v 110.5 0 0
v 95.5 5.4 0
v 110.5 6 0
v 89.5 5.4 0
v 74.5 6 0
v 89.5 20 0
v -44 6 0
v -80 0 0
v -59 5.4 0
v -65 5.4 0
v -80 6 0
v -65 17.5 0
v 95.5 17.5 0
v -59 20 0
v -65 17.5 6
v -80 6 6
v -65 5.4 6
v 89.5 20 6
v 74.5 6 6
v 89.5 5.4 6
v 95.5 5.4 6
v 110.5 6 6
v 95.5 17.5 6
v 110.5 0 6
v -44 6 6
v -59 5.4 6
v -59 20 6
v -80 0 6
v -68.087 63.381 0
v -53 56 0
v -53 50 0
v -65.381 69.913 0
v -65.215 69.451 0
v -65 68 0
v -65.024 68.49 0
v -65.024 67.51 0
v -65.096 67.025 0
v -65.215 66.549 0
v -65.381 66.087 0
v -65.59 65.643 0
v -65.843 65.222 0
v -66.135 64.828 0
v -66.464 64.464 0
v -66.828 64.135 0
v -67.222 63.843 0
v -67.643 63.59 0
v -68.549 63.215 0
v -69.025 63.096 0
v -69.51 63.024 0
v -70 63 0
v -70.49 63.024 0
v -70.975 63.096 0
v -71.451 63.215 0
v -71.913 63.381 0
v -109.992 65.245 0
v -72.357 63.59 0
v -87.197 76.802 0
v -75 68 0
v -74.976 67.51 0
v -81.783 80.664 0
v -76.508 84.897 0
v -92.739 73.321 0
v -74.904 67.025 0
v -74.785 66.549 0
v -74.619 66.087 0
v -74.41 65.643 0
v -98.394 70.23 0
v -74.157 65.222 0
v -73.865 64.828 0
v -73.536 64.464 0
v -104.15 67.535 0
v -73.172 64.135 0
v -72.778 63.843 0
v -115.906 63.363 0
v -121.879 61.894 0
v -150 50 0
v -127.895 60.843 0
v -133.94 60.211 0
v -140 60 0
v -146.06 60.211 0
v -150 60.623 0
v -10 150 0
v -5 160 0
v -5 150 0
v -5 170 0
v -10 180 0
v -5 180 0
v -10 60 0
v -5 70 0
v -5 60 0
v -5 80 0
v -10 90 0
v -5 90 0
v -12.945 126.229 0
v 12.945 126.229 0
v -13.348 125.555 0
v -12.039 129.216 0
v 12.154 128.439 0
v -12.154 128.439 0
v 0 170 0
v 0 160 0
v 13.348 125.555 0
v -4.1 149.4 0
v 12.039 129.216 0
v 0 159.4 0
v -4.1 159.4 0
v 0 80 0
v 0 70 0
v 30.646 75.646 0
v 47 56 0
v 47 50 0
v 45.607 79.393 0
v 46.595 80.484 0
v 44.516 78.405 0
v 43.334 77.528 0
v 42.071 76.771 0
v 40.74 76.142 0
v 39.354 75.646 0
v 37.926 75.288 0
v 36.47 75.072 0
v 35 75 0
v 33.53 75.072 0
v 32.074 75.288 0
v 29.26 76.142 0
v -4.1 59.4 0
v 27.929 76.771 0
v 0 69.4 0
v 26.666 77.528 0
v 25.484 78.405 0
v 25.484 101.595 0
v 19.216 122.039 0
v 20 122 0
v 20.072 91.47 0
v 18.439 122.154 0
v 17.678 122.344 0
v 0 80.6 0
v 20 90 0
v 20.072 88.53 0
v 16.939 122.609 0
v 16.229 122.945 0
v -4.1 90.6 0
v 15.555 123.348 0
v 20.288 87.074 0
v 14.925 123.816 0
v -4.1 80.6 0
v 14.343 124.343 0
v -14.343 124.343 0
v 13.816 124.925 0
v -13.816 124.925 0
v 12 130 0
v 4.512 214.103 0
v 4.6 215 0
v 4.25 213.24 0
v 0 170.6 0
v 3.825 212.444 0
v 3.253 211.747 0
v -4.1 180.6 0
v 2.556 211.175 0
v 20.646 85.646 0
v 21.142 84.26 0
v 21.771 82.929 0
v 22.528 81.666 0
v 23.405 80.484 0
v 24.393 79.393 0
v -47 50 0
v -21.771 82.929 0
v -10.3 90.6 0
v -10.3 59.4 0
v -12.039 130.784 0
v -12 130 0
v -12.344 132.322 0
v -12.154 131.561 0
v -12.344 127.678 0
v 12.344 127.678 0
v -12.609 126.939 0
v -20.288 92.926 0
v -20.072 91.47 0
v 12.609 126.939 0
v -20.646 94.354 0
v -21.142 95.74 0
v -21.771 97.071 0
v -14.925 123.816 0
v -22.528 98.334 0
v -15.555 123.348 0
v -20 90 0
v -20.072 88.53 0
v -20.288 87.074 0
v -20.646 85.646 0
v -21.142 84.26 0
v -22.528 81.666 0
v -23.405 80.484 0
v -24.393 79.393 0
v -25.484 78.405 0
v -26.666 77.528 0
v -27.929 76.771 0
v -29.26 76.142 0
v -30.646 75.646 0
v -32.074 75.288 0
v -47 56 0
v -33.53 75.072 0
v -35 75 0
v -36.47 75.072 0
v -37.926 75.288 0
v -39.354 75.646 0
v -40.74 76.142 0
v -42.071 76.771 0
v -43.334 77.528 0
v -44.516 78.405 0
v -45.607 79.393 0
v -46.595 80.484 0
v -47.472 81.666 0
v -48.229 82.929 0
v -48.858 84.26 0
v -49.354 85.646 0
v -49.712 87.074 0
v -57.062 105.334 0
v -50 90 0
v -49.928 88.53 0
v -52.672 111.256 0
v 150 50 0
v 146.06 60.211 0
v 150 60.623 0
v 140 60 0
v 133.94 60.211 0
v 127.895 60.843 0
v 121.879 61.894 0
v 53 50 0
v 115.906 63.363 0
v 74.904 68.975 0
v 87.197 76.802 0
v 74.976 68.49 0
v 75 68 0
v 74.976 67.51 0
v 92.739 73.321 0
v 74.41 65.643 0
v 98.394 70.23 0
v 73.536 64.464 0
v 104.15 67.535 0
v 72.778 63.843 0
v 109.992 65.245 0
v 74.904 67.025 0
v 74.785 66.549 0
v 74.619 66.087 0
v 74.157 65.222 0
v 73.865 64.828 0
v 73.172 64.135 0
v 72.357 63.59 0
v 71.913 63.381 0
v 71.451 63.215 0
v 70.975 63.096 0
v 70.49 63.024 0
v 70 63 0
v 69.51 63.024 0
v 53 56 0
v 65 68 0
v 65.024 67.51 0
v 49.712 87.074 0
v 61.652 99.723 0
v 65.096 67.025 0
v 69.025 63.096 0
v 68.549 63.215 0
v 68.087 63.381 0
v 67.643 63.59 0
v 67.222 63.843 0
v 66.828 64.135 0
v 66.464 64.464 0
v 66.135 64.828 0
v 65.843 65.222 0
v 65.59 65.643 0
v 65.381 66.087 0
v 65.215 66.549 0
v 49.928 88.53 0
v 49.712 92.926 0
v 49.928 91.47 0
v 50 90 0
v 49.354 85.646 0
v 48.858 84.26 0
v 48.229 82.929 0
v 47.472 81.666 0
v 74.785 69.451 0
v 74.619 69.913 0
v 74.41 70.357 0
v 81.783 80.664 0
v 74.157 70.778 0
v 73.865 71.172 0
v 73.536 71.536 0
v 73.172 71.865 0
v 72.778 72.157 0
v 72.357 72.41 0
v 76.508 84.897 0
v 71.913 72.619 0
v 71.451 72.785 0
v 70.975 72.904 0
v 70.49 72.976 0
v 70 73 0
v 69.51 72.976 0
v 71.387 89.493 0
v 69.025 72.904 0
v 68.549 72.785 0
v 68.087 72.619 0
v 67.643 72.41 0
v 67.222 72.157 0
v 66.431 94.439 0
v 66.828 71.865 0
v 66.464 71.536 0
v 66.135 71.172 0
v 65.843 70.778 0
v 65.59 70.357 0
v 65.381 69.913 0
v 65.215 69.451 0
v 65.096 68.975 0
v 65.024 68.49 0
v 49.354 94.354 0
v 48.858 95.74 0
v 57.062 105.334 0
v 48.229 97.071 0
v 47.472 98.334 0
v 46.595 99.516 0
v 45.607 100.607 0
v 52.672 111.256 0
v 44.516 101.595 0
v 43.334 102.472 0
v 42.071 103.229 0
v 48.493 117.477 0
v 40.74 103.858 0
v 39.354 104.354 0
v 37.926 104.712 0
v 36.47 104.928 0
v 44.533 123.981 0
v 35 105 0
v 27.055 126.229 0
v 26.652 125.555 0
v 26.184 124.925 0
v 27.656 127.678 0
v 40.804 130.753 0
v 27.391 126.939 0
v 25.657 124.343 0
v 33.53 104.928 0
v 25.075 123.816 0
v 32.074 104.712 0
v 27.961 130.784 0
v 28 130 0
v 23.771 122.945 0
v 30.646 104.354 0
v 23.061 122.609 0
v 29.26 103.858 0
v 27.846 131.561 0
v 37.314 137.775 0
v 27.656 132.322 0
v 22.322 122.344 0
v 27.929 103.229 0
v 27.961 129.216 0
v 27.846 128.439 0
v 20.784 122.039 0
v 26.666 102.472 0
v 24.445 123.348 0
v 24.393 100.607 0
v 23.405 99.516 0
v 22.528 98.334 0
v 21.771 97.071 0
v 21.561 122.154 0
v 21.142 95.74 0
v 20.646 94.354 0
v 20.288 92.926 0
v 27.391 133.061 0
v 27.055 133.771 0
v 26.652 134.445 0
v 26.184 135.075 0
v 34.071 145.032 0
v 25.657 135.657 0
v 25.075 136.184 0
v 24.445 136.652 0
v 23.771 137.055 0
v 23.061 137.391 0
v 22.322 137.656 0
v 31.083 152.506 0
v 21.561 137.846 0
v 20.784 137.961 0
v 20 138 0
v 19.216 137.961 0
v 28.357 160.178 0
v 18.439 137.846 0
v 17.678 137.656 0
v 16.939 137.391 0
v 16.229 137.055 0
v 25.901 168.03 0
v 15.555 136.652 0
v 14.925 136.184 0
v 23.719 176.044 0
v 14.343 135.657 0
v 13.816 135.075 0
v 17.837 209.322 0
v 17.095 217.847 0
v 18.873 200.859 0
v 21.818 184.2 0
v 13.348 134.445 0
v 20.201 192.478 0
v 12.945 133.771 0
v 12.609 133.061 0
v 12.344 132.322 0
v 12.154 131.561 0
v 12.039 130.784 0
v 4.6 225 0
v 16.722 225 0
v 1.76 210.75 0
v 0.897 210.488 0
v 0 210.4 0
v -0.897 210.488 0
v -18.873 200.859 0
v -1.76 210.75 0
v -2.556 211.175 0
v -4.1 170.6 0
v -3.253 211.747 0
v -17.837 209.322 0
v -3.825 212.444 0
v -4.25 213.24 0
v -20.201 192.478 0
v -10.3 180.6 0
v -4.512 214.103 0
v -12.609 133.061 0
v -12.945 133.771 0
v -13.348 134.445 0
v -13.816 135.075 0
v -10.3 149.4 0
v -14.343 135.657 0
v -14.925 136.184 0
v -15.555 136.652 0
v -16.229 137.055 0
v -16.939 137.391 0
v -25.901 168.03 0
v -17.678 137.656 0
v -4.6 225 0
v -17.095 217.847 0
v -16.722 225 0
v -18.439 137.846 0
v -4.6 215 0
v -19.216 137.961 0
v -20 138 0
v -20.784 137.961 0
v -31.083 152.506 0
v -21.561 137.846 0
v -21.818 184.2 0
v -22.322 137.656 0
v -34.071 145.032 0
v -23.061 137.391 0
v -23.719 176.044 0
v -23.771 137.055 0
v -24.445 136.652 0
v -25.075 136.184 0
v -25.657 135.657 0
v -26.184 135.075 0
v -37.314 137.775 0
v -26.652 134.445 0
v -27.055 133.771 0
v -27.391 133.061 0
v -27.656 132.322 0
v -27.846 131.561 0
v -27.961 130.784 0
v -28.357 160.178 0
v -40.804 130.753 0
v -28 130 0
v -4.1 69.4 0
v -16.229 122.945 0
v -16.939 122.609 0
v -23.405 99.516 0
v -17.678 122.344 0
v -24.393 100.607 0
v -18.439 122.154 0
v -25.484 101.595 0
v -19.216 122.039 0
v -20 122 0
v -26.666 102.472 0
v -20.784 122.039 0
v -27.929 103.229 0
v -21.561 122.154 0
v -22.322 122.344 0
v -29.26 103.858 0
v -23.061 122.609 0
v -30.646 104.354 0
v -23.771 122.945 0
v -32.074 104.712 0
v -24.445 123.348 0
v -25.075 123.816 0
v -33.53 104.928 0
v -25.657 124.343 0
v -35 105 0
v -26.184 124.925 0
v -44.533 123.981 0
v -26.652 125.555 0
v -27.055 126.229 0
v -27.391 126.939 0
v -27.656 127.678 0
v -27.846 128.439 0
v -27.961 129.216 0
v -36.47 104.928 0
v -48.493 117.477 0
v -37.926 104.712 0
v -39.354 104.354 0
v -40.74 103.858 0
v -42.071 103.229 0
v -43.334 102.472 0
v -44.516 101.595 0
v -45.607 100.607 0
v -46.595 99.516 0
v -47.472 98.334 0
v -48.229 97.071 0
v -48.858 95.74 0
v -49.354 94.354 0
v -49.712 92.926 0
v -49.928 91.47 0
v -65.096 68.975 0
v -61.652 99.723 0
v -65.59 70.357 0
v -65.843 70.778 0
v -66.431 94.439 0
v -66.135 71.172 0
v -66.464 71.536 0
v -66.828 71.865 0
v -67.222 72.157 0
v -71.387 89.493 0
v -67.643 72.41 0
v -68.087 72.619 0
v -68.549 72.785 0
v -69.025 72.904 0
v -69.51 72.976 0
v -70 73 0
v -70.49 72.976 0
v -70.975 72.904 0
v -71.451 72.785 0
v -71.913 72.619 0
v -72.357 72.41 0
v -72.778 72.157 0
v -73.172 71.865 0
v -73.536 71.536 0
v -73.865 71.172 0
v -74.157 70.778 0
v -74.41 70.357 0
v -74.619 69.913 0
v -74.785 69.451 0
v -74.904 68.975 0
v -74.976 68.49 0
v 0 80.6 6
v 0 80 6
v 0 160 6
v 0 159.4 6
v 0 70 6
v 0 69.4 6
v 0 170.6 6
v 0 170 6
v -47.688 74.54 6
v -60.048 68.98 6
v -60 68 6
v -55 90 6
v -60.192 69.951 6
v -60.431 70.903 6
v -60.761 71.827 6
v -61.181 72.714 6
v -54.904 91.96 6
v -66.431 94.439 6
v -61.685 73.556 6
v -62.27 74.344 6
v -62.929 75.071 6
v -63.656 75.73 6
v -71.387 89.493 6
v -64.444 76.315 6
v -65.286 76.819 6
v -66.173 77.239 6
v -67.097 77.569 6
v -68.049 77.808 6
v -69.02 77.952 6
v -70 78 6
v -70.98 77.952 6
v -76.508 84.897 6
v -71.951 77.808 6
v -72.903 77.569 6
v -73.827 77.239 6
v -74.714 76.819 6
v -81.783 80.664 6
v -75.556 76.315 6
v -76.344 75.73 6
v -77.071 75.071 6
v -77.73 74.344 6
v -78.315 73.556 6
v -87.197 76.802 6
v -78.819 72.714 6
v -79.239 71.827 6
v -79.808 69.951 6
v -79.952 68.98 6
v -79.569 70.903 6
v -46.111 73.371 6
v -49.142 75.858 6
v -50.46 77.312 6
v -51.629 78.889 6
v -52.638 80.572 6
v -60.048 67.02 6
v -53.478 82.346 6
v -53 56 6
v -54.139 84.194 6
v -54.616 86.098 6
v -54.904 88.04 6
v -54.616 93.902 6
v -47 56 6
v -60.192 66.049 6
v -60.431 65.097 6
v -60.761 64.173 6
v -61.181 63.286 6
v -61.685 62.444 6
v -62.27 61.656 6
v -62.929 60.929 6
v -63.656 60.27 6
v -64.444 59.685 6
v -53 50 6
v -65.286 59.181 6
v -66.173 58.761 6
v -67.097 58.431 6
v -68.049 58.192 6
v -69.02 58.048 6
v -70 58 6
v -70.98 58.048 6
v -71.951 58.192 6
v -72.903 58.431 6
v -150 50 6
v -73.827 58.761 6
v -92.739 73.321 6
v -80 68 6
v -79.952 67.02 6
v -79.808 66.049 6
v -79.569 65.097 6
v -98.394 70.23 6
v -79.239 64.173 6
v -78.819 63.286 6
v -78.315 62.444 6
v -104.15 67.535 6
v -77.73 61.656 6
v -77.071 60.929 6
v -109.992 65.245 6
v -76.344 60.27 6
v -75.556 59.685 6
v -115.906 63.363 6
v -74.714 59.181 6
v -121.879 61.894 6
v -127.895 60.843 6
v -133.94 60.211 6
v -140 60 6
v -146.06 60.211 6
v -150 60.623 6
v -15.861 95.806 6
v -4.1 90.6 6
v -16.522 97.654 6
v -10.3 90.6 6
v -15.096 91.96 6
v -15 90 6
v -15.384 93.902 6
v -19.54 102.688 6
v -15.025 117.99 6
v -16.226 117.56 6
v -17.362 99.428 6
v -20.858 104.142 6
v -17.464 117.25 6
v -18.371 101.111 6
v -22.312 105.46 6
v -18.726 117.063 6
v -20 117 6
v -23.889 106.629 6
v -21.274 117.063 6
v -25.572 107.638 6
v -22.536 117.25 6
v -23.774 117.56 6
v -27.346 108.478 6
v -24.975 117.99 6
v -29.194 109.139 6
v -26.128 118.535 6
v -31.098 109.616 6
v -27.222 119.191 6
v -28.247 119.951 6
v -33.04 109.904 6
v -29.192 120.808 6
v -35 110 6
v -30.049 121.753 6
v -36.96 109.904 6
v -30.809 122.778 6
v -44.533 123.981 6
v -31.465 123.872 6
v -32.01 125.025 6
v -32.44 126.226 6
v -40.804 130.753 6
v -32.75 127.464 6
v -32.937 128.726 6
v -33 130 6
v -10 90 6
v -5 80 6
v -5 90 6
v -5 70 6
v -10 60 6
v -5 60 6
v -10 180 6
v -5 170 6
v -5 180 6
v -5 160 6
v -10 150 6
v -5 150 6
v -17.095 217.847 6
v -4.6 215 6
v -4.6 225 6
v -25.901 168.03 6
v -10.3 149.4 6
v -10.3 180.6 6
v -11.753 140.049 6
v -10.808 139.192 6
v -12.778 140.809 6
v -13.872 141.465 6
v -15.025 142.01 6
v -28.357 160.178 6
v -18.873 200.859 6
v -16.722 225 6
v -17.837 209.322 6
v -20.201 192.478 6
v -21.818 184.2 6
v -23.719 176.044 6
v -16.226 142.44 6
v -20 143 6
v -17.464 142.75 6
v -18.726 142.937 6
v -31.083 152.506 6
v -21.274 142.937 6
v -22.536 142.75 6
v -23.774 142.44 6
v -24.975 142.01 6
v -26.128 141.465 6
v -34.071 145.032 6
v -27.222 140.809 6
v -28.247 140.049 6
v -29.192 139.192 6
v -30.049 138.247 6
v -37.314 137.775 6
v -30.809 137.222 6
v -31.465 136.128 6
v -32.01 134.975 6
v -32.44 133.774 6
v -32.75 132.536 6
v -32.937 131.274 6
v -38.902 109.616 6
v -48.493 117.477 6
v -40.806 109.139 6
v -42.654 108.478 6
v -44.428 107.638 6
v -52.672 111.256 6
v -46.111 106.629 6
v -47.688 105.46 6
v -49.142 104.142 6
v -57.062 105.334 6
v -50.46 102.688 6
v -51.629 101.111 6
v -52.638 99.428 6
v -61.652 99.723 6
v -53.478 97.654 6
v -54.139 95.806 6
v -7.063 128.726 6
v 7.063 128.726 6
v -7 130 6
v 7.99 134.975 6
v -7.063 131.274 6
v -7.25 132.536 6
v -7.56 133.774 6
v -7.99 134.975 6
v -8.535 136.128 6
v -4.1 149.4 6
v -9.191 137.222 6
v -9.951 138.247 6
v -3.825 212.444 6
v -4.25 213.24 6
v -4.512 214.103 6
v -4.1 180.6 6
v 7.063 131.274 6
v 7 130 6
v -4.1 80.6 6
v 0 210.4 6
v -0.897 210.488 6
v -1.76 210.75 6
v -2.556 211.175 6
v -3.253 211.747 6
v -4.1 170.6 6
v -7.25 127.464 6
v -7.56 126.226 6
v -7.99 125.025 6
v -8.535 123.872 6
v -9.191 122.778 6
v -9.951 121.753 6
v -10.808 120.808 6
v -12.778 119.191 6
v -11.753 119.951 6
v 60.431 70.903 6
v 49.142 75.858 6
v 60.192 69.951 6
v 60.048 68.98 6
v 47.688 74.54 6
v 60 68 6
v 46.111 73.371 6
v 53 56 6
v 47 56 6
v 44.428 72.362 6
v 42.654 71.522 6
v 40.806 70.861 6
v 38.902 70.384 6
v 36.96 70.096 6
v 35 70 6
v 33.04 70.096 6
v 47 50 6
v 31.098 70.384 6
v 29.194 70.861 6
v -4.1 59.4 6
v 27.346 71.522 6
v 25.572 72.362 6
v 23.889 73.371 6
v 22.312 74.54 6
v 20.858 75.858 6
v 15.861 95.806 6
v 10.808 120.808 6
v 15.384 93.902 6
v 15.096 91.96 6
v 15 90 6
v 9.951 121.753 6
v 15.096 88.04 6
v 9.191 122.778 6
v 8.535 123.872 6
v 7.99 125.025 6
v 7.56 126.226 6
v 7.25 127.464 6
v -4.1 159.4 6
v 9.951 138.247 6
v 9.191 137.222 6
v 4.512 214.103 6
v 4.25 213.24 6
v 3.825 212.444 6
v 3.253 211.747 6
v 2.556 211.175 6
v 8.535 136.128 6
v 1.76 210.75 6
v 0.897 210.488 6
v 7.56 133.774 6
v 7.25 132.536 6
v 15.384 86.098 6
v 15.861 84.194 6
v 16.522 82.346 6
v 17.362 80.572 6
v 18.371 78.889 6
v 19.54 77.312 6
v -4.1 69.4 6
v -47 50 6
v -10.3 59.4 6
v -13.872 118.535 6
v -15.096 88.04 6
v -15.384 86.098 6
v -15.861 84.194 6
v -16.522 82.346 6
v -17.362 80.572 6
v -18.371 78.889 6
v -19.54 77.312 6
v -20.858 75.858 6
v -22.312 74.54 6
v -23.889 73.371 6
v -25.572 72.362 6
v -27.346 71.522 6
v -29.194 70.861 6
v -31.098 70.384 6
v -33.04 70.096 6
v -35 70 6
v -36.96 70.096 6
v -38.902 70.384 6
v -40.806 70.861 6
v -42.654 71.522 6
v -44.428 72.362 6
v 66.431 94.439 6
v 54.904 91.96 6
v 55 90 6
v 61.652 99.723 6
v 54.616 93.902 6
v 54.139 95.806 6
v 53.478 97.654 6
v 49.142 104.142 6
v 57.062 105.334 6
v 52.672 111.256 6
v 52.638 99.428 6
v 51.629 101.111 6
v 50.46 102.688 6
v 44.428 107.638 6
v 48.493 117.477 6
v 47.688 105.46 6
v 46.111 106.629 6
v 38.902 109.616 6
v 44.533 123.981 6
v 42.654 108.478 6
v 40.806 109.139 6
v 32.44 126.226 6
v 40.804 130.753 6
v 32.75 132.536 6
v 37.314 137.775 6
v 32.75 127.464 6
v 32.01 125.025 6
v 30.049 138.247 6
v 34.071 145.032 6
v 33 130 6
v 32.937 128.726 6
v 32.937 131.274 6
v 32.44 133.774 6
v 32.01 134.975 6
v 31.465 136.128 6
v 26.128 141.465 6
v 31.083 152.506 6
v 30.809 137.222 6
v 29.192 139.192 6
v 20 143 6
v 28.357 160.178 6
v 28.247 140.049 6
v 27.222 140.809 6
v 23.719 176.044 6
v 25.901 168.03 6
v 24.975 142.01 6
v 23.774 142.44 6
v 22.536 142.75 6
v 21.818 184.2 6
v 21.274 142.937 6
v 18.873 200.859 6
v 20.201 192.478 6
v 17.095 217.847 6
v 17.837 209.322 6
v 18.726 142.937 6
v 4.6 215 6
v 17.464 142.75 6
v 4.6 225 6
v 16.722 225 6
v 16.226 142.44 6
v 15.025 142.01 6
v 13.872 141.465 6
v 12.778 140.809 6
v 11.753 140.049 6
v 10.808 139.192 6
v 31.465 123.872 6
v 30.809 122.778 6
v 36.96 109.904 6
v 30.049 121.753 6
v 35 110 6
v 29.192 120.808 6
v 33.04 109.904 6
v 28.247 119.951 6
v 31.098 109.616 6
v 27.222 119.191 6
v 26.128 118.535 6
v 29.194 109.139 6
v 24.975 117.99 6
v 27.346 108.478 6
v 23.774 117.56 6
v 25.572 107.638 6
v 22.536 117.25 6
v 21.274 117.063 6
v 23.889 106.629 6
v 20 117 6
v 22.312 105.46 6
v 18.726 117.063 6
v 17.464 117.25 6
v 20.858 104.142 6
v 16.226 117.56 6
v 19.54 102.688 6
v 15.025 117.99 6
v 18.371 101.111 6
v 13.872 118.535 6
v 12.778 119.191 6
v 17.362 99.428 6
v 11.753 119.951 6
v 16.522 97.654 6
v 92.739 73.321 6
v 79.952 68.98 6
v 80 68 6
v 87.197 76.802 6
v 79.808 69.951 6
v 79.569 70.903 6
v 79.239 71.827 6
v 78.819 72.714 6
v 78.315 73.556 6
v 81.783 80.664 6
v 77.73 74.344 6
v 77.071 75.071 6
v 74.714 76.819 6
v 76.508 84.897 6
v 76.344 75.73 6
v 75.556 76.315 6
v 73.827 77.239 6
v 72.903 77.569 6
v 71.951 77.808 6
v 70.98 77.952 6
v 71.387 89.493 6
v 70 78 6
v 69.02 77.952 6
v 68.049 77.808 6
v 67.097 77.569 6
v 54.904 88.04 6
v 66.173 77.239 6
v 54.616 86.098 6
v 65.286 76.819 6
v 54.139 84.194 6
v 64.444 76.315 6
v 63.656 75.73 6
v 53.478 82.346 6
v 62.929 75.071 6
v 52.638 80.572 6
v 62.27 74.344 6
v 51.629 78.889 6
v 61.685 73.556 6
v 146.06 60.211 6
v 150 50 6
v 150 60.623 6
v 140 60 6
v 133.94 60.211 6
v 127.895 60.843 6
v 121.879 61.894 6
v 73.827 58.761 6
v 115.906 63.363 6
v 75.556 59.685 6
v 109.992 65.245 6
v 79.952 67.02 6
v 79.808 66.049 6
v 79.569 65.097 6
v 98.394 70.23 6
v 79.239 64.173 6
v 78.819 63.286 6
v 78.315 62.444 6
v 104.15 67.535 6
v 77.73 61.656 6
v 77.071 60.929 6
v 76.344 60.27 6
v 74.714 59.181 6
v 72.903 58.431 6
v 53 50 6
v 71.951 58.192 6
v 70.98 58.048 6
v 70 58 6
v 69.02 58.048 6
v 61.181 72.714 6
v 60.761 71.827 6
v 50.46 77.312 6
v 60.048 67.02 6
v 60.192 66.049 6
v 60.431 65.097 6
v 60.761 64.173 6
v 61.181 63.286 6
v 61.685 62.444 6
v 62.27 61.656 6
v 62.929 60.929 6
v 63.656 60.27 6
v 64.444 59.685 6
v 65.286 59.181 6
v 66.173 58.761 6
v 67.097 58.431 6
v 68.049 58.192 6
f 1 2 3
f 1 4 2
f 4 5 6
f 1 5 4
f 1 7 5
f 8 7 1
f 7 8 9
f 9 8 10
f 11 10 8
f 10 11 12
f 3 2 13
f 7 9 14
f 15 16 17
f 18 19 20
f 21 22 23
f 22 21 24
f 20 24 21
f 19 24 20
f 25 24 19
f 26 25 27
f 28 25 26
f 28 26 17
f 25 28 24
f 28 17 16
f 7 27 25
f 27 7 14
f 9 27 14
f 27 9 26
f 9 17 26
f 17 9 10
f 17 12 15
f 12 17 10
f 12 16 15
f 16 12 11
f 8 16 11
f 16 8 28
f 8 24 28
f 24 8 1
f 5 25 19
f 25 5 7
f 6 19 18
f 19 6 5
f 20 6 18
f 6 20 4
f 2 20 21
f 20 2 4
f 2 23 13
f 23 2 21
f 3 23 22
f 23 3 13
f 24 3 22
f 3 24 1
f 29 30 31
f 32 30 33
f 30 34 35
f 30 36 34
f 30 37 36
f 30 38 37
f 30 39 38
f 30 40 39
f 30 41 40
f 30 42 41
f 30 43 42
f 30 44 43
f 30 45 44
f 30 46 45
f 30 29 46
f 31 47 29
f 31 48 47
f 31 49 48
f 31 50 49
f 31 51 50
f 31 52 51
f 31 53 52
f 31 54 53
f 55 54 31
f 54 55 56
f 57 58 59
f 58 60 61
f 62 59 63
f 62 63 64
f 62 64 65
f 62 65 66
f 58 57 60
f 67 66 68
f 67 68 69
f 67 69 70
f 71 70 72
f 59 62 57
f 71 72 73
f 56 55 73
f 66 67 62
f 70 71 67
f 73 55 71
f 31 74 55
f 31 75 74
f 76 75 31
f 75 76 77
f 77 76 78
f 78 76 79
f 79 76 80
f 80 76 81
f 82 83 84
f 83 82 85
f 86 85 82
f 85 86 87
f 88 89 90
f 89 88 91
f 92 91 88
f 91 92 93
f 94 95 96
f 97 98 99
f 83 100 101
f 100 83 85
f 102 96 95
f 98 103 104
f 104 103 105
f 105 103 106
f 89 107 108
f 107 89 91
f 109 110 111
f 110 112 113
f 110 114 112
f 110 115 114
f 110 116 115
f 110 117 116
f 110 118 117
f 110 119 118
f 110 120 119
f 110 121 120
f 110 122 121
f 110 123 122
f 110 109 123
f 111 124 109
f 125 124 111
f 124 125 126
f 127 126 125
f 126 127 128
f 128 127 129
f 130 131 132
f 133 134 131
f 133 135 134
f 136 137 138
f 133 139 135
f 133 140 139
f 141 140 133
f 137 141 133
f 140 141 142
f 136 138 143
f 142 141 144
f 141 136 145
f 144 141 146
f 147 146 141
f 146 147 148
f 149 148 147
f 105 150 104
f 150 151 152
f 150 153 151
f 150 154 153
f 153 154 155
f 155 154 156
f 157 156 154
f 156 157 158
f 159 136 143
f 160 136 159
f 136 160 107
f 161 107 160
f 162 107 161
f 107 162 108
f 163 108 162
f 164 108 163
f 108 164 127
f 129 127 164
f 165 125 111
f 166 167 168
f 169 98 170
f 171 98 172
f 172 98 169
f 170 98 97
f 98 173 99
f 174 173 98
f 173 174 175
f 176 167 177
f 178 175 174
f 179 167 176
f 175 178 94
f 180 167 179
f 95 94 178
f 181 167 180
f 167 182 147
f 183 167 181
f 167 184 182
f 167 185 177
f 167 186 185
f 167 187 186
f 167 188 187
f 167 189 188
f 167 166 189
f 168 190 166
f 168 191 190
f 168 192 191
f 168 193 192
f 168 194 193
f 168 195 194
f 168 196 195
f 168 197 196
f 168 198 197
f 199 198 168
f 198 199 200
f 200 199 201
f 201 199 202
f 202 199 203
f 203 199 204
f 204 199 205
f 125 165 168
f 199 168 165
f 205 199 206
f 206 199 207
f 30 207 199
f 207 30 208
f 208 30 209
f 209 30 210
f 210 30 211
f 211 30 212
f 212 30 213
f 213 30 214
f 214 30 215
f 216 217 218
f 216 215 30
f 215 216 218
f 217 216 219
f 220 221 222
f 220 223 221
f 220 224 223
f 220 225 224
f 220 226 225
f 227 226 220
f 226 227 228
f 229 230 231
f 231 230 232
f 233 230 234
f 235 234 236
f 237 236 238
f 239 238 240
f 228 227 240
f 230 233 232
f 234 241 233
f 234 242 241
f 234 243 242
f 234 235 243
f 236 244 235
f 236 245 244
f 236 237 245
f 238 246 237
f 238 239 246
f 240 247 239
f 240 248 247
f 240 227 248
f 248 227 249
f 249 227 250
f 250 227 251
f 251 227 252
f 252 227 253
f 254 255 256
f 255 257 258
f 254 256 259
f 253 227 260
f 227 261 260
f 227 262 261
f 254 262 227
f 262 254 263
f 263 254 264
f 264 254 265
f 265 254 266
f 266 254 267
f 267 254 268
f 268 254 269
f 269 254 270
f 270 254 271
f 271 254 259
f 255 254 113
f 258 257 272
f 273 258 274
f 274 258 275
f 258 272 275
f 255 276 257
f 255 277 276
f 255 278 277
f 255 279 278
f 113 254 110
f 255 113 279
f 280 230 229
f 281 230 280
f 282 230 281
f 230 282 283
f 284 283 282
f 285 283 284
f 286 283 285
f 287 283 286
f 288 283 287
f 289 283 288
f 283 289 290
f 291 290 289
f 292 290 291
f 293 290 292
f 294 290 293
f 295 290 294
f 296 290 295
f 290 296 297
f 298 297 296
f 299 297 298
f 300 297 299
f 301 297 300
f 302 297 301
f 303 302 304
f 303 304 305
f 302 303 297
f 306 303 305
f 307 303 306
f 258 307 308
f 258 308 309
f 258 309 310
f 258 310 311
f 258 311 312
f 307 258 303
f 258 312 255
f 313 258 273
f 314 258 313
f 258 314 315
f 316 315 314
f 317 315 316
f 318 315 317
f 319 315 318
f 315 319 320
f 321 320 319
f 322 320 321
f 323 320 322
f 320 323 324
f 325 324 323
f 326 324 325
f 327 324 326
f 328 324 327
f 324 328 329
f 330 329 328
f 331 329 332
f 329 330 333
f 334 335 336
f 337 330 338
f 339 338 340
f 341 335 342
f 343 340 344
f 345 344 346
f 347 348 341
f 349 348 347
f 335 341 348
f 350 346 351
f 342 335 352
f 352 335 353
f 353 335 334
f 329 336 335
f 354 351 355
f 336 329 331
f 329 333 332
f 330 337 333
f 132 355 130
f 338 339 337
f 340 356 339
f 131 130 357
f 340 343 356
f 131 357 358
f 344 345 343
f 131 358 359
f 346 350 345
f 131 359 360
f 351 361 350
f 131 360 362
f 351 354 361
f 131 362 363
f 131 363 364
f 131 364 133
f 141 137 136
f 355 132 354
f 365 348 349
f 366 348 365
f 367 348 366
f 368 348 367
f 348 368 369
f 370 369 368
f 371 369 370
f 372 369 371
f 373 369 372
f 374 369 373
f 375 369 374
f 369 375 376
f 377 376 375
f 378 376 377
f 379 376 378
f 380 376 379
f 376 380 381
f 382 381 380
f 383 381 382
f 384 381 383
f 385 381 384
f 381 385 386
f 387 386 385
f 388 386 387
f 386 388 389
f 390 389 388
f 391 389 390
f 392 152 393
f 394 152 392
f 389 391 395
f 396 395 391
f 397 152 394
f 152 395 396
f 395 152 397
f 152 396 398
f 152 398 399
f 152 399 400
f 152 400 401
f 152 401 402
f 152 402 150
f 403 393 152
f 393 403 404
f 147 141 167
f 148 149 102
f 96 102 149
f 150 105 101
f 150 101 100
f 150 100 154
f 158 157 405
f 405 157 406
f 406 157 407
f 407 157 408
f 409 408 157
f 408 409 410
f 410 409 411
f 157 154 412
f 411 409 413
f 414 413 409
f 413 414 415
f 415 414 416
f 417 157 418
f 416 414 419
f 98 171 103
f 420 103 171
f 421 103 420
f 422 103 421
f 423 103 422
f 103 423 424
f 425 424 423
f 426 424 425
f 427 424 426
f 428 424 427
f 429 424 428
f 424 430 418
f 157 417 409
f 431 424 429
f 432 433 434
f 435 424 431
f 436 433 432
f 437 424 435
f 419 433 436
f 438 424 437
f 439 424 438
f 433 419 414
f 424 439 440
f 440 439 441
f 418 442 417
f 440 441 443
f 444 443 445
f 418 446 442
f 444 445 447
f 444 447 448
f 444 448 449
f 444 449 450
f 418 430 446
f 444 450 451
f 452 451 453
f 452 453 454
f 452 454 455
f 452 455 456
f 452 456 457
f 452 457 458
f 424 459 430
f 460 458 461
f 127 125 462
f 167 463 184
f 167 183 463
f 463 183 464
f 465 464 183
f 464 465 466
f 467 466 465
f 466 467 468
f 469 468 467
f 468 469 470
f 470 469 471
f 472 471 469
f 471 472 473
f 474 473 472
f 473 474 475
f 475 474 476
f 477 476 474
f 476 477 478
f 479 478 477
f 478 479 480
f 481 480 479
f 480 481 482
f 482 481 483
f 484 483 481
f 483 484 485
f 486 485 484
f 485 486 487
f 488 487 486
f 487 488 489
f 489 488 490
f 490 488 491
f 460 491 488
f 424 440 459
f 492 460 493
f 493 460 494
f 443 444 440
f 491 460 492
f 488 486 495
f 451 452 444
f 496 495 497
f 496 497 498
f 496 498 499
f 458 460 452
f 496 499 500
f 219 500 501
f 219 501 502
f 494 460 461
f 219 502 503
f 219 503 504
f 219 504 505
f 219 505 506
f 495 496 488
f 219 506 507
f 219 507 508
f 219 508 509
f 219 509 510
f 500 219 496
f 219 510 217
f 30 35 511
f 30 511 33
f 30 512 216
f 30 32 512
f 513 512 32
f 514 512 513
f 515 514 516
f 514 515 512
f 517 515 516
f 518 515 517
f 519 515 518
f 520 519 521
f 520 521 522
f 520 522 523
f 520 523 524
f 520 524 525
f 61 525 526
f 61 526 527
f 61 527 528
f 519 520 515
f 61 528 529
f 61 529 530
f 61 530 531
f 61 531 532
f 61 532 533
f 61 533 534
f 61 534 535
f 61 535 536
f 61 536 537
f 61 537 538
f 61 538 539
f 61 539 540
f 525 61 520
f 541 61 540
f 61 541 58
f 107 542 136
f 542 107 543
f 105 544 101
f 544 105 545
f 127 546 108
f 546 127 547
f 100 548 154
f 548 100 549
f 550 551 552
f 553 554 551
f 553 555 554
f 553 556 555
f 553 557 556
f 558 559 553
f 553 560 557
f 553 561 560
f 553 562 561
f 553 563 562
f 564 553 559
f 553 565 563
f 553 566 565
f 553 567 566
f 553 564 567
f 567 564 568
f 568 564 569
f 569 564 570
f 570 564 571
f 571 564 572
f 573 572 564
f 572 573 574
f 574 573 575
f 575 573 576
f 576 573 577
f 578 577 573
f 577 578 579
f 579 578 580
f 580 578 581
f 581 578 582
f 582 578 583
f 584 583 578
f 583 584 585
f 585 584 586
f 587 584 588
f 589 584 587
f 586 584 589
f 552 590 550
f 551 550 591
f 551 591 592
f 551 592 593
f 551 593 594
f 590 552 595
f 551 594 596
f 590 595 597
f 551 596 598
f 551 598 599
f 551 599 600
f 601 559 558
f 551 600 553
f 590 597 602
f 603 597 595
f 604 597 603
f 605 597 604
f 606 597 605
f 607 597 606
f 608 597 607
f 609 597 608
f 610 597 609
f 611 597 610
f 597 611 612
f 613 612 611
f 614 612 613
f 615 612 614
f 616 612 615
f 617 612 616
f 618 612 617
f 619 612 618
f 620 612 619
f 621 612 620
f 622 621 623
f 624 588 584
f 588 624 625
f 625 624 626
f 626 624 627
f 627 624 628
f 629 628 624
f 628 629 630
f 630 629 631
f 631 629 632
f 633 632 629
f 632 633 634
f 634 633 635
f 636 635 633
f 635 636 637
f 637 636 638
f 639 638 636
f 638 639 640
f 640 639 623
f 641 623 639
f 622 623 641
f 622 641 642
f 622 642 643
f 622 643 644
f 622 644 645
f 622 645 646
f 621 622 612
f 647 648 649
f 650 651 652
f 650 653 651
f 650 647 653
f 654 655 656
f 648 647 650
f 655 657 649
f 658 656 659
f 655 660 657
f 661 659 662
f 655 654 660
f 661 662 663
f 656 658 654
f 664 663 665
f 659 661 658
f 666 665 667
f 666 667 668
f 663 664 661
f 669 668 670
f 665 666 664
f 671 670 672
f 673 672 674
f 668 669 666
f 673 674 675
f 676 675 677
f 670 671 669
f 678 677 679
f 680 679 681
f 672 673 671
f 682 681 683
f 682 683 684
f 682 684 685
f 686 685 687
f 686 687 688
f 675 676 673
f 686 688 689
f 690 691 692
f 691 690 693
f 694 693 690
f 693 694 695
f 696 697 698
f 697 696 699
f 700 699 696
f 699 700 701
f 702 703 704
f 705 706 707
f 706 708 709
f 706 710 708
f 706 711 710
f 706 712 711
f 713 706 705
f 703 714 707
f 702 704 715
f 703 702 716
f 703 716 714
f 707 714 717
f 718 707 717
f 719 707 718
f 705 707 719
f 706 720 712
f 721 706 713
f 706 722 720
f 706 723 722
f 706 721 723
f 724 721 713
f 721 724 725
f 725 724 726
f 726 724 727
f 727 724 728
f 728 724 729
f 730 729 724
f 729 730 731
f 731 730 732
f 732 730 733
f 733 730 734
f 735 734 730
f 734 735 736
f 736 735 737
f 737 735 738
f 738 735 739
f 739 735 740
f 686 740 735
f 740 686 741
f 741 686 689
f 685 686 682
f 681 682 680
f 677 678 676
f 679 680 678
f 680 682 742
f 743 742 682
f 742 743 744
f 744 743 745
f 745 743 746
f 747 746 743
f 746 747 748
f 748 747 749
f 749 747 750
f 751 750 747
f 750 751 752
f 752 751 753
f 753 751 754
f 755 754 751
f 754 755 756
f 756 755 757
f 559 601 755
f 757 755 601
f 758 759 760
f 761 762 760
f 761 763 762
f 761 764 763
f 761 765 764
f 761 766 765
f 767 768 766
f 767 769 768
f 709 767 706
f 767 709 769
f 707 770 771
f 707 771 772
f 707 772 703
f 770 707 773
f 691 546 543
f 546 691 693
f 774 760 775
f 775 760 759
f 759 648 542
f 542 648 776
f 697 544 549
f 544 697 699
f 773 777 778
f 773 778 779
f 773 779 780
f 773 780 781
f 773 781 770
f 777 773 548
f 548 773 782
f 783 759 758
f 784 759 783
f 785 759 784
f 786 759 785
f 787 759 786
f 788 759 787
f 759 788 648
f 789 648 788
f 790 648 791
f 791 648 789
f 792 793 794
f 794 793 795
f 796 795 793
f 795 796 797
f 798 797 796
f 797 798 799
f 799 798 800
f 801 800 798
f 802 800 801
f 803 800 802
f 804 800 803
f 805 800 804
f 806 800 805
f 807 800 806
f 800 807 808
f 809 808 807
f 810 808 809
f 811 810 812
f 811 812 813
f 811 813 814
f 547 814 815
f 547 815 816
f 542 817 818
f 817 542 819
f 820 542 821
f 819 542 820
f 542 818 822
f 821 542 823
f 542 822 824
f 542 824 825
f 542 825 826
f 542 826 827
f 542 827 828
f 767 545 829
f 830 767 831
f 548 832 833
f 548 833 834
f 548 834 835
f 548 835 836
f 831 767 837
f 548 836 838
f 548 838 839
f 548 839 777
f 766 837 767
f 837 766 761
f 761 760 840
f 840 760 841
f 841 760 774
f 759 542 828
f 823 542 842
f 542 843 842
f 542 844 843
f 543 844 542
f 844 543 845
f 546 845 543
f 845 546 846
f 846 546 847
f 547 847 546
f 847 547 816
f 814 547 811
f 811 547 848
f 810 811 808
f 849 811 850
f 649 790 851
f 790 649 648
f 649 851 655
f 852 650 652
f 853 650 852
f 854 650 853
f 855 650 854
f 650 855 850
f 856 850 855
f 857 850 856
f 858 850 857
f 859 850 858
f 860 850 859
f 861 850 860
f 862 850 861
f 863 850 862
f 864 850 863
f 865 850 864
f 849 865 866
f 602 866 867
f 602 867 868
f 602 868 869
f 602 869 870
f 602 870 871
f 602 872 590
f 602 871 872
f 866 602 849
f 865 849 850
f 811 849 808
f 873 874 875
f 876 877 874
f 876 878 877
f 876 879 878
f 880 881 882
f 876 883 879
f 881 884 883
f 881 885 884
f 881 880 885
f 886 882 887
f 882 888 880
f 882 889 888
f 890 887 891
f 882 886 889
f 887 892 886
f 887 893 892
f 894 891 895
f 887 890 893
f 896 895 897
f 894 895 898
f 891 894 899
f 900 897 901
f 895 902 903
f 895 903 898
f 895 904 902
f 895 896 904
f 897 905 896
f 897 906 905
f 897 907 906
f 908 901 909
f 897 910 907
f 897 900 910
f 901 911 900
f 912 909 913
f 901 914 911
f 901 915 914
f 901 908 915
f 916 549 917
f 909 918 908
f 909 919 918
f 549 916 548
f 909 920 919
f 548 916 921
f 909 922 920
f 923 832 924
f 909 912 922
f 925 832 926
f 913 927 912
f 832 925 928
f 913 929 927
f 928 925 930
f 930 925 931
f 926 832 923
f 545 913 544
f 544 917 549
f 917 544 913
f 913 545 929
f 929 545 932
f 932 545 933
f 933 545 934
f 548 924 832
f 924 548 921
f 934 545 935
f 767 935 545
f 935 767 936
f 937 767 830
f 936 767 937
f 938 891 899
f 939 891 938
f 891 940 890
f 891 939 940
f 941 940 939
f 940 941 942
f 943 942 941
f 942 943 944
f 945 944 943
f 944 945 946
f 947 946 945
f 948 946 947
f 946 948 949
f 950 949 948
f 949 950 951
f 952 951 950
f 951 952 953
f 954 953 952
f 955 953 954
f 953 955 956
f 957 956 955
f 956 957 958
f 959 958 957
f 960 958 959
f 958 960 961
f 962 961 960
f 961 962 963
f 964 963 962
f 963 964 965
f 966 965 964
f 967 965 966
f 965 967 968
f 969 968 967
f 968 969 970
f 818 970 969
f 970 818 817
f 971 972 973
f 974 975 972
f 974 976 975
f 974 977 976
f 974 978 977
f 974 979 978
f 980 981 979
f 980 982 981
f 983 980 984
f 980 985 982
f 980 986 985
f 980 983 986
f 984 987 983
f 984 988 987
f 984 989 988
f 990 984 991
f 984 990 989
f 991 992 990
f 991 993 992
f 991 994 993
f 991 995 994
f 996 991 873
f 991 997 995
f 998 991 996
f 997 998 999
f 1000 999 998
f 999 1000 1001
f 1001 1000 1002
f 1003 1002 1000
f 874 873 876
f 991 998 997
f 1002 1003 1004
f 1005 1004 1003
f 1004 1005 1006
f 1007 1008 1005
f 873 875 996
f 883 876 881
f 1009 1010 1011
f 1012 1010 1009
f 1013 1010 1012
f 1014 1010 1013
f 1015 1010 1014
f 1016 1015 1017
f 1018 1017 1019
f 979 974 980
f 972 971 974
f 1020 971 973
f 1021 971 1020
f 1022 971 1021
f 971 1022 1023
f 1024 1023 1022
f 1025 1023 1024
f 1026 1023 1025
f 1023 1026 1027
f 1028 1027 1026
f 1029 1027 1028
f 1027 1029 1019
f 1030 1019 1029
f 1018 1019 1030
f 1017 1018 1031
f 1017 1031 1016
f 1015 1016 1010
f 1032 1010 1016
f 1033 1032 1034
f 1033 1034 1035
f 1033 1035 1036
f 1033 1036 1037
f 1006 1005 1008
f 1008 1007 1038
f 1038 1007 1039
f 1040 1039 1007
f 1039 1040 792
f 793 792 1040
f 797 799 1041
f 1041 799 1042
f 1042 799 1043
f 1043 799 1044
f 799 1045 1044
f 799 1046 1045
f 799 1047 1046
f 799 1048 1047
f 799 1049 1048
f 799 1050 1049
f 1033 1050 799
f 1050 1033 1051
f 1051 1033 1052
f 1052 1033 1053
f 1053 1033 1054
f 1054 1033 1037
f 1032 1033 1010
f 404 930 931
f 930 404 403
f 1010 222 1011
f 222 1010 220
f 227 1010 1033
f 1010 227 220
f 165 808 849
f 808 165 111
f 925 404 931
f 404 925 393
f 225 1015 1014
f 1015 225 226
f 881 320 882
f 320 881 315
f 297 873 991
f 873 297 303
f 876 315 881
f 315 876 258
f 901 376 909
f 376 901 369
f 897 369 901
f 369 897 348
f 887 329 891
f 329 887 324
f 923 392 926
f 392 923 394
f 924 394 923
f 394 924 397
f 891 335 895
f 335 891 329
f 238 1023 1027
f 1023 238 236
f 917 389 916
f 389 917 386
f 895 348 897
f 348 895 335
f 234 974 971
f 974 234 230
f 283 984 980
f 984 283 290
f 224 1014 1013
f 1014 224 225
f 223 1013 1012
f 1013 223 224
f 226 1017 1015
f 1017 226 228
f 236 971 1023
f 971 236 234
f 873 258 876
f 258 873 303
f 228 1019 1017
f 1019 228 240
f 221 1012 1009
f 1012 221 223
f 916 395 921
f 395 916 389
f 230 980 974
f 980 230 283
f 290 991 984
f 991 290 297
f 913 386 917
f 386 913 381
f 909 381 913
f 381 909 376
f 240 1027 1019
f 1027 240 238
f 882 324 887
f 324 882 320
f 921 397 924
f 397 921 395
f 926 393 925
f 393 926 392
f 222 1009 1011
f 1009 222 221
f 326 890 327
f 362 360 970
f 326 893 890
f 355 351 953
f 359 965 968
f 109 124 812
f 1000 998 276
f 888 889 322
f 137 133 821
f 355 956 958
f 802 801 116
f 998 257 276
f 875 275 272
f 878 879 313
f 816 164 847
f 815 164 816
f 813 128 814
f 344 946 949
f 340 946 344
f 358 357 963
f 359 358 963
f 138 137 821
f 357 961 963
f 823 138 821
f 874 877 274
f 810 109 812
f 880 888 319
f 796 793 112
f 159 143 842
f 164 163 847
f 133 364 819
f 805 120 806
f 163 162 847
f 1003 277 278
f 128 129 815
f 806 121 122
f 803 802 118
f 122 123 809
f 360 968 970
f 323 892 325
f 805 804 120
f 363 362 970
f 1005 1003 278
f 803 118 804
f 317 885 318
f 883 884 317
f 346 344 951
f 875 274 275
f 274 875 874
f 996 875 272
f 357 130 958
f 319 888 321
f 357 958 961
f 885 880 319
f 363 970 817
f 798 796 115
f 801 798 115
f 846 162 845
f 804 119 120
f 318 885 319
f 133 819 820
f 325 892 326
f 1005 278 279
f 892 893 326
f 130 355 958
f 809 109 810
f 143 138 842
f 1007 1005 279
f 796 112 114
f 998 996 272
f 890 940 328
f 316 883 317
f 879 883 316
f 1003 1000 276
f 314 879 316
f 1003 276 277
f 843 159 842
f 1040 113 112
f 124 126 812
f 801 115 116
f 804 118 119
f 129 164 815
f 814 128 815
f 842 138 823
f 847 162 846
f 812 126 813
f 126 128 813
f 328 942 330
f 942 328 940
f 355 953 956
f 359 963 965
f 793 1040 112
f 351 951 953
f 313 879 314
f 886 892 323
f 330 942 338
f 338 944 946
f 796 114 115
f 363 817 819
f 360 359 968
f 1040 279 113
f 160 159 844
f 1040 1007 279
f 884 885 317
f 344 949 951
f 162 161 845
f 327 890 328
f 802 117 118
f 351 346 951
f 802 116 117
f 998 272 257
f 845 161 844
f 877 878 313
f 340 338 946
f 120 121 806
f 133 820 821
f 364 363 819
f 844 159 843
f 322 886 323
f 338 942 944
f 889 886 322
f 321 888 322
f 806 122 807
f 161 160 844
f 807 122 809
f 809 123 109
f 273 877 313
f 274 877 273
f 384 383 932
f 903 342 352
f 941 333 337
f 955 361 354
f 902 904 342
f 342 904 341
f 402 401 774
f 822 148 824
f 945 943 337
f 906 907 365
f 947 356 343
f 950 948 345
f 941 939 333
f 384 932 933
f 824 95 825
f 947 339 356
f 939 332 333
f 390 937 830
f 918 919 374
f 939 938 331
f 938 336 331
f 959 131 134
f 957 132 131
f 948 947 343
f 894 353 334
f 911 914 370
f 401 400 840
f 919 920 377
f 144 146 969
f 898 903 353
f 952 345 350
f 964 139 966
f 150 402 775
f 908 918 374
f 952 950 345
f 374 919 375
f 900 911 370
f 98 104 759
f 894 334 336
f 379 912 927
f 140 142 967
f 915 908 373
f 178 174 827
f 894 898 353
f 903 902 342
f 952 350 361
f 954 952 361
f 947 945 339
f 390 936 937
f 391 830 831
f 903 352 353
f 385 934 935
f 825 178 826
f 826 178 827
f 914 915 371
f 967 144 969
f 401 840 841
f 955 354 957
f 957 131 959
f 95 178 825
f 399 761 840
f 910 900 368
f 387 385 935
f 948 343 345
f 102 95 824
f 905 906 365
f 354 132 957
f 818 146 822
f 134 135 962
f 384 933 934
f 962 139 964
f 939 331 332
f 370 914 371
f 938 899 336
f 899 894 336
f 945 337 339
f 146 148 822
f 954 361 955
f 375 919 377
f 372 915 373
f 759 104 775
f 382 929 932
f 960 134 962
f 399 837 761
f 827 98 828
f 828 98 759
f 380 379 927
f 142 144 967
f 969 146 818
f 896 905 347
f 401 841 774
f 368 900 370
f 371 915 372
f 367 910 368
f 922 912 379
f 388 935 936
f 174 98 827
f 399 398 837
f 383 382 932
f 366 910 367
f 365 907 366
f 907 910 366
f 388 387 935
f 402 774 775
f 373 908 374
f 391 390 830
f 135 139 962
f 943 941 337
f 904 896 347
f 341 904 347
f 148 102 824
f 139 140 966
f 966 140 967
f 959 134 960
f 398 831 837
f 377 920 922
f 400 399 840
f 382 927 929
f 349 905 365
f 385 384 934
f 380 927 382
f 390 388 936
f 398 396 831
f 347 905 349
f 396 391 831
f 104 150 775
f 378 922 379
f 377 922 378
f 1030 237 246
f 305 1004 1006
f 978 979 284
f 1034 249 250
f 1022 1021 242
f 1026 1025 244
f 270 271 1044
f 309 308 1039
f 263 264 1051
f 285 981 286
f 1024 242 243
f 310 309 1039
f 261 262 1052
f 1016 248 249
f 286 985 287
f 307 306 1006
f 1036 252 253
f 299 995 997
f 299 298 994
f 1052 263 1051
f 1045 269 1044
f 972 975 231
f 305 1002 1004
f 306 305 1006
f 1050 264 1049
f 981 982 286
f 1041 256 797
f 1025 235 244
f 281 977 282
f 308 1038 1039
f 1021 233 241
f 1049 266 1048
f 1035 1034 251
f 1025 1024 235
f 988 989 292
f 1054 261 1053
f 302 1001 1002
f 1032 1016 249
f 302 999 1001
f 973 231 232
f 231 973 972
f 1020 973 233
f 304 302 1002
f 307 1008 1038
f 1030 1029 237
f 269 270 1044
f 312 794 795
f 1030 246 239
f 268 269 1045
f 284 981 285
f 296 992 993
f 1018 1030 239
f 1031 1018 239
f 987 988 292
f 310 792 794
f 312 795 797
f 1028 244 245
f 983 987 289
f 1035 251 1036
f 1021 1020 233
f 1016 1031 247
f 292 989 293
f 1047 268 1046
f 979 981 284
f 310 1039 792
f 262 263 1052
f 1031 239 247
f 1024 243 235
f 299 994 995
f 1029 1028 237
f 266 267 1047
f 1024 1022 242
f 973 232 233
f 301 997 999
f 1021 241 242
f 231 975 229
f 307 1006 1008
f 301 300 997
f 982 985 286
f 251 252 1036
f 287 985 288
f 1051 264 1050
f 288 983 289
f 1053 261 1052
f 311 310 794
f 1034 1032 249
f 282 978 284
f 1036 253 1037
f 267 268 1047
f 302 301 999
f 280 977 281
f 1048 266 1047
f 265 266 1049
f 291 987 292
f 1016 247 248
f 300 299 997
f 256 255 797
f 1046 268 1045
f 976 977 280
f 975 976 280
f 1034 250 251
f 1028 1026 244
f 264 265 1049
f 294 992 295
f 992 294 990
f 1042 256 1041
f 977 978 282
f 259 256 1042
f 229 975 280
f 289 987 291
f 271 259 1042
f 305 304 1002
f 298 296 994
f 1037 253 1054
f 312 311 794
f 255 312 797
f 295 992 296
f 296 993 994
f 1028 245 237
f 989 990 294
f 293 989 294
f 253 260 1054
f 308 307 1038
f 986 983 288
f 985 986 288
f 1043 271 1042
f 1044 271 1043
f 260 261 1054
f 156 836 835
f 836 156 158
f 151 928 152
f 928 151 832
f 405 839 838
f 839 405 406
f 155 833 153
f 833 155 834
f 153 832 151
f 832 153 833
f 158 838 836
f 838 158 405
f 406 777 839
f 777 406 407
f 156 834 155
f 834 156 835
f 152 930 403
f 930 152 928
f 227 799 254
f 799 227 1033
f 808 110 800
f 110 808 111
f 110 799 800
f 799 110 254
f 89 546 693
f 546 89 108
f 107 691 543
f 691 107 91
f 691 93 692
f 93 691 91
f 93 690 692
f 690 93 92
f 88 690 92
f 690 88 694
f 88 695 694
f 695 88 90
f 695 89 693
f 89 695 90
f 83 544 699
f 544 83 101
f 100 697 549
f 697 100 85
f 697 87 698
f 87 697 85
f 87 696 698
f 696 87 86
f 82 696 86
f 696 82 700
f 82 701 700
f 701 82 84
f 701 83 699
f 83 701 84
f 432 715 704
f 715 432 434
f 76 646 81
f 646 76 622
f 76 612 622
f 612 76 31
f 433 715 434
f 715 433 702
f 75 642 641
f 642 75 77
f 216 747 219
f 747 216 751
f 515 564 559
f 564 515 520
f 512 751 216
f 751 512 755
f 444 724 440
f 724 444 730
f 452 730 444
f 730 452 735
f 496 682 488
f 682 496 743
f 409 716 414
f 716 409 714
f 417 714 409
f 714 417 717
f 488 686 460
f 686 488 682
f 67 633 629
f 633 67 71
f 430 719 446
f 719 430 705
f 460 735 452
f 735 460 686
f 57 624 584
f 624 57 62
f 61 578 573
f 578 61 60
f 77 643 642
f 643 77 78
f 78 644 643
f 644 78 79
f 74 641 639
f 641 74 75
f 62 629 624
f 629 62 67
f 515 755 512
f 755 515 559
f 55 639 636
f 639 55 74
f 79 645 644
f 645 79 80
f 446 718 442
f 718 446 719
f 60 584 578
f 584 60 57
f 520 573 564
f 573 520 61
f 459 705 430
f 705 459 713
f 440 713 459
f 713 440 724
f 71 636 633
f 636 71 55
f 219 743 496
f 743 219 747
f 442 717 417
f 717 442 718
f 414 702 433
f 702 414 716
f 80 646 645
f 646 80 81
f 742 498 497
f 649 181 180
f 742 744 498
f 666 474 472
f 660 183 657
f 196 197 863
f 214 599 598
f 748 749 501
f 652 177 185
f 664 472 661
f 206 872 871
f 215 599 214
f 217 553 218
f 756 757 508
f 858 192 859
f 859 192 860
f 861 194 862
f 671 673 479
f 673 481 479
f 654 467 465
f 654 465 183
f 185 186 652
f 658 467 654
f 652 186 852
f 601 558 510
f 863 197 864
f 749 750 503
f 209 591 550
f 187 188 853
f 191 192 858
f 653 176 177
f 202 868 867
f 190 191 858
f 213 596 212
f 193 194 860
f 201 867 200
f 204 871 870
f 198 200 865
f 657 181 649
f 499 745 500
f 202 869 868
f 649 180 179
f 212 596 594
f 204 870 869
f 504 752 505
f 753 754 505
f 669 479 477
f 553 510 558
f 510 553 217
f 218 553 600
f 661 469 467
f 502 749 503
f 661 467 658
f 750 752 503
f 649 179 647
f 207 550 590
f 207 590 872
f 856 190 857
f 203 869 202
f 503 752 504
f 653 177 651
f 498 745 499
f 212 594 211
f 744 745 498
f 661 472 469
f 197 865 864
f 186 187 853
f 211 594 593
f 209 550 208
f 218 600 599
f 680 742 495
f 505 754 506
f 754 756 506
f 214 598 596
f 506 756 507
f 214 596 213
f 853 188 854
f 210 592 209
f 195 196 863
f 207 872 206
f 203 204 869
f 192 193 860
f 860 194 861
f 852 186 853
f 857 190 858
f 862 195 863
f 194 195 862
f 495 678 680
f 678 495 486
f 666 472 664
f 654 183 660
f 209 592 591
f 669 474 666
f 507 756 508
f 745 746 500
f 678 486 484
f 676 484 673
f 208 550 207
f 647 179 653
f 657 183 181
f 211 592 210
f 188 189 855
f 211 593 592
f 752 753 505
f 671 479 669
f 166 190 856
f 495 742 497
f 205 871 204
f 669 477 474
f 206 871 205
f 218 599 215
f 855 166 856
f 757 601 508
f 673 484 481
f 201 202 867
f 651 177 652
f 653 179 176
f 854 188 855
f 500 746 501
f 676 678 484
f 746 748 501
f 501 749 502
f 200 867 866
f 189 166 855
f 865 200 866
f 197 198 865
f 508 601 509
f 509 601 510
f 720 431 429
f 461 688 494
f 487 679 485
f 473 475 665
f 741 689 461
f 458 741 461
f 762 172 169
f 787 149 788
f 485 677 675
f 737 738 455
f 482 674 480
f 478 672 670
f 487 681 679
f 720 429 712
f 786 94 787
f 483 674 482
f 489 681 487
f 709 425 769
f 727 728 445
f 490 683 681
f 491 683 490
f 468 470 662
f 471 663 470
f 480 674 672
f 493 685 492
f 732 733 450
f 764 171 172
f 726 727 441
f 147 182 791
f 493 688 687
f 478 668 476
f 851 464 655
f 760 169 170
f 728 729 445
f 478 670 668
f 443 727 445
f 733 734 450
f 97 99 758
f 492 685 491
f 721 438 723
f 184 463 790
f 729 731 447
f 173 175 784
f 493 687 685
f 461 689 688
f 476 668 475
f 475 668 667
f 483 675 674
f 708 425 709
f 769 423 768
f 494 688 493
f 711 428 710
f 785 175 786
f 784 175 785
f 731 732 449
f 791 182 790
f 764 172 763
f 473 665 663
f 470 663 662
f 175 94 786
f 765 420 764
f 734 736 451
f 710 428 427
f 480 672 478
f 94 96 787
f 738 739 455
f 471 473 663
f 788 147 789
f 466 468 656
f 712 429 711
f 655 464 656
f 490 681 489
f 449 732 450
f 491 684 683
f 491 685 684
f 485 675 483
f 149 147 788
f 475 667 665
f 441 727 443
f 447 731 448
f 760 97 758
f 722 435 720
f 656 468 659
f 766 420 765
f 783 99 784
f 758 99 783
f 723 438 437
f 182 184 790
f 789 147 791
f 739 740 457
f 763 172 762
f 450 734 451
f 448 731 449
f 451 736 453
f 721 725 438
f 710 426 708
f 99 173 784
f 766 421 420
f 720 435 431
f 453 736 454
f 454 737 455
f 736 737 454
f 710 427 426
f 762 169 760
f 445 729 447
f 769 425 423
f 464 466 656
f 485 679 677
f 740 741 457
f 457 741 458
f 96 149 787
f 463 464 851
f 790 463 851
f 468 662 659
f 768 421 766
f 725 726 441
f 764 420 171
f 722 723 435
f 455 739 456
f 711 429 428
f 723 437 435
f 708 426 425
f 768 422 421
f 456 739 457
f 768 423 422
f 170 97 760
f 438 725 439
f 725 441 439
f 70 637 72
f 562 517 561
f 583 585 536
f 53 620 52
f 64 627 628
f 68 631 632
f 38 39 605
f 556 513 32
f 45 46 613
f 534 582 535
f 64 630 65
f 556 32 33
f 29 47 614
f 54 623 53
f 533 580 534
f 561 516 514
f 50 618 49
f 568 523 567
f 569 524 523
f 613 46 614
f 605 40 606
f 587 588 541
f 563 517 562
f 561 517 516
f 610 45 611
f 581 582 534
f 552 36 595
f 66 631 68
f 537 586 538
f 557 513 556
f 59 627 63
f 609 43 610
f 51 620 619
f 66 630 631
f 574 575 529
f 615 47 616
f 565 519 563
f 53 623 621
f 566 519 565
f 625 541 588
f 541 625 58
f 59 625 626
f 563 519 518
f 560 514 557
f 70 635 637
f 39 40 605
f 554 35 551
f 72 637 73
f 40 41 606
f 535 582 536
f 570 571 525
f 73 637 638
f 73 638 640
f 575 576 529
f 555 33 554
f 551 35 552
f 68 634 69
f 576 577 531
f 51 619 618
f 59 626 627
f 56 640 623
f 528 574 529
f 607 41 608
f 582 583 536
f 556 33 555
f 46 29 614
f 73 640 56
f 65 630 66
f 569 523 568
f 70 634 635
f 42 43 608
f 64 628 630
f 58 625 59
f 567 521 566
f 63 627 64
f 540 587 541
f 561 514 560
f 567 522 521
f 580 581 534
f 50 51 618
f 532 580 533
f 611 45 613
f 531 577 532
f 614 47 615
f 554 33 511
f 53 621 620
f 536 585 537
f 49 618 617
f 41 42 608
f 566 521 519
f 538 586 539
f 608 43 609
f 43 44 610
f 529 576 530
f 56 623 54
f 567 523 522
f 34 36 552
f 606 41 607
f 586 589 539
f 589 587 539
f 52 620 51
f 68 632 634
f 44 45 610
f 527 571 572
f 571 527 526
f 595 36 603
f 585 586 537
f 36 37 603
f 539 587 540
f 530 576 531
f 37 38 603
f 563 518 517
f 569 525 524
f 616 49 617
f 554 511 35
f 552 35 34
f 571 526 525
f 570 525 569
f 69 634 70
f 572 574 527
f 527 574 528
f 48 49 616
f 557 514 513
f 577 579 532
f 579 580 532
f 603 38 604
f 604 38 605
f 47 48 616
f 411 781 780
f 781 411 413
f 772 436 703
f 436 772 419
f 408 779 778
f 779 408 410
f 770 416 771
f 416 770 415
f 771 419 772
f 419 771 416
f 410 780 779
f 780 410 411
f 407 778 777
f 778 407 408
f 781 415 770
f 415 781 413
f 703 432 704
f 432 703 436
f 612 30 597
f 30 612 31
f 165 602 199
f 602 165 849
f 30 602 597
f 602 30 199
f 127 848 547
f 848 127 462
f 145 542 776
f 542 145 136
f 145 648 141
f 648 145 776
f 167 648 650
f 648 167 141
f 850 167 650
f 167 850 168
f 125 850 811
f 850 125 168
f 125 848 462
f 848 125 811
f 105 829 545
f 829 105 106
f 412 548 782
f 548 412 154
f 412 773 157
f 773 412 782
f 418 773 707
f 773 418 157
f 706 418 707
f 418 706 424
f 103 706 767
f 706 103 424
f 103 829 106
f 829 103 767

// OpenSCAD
HOLDER_THICKNESS = 6;
HOLDER_HEIGHT = 175;
HOLDER_LENGTH = 150;
SPOOL_SIZE = 148.5;
SPOOL_SIZE_MARGIN = 0;
SPOOL_INNER_RADIUS = 53 / 2;

HOLDER_SIDE_DISTANCE = SPOOL_SIZE + SPOOL_SIZE_MARGIN;

BAR_CLIP_SIZE_X = 15;
BAR_CLIP_SIZE_Y= 20;
BAR_CLIP_SIZE_Y_OUTER= 17.5;
BAR_WIDTH = 6;
BAR_HEIGHT = 6;

ROD_RADIUS = 8 / 2;

JOINT_MARGIN = 0.6;

module base() {
  difference() {
    linear_extrude(HOLDER_THICKNESS)
      square([HOLDER_LENGTH, HOLDER_HEIGHT]);

    linear_extrude(HOLDER_THICKNESS)
      translate([HOLDER_LENGTH - 10, HOLDER_HEIGHT + 10, 0])
        resize([HOLDER_LENGTH * 2 - SPOOL_INNER_RADIUS * 2, HOLDER_HEIGHT * 2])
          circle(r = HOLDER_HEIGHT, $fn = 128);

    translate([35, 40, 0])
      cylinder(r1=15, r2=20, h=HOLDER_THICKNESS, $fn = 64);

    translate([20, 80, 0])
      cylinder(r1=8, r2=13, h=HOLDER_THICKNESS, $fn = 64);

    translate([70, 18, 0])
      cylinder(r1=5, r2=10, h=HOLDER_THICKNESS, $fn = 64);
  }
}

module guide() {
  RADIUS = ROD_RADIUS + JOINT_MARGIN;
  translate([0, -10, 0]) cylinder(r=RADIUS, h=HOLDER_THICKNESS, $fn=32);
  translate([0, -10, 0]) cube([RADIUS, 20, HOLDER_THICKNESS]);
}

module side() {
  difference() {
    base();

    translate([0, HOLDER_HEIGHT, 0])
      guide();

    translate([HOLDER_LENGTH / 3 - BAR_WIDTH / 2, -1, -1])
      cube([BAR_WIDTH, BAR_HEIGHT + 1, HOLDER_THICKNESS + 2]);
  }
}

module side_clip(OFFSET = 0) {
  COORDS = [
    [-10, 0],
    [-10, 30],
    [-5, 30],
    [-5, 20],
    [0, 20],
    [0, 10],
    [-5,10],
    [-5, 0]
  ];
  translate([OFFSET/2, 0, -OFFSET/2])
    linear_extrude(HOLDER_THICKNESS + OFFSET)
      offset(delta =  OFFSET)
        polygon(COORDS);
}

module side_l() {
  union() {
    side();
    translate([0, 10, 0]) side_clip();
    translate([0, 100, 0]) side_clip();
  }
}

module side_r() {
  difference() {
      mirror([1, 0, 0]) side();
      translate([0, 10, 0]) side_clip(JOINT_MARGIN);
      translate([0, 100, 0]) side_clip(JOINT_MARGIN);
  }
}

module bar_clip() {
  BAR_HEIGHT_1 = BAR_HEIGHT - JOINT_MARGIN;
  linear_extrude(BAR_WIDTH)
    polygon([
      [0, 0],
      [0, BAR_HEIGHT],
      [BAR_CLIP_SIZE_X, BAR_CLIP_SIZE_Y_OUTER],
      [BAR_CLIP_SIZE_X, BAR_HEIGHT_1],
      [BAR_CLIP_SIZE_X + HOLDER_THICKNESS, BAR_HEIGHT_1],
      [BAR_CLIP_SIZE_X + HOLDER_THICKNESS, BAR_CLIP_SIZE_Y],
      [BAR_CLIP_SIZE_X * 2 + HOLDER_THICKNESS, BAR_HEIGHT],
      [BAR_CLIP_SIZE_X * 2 + HOLDER_THICKNESS, 0]
    ]);
}

module bar() {
  bar_clip();

  translate([BAR_CLIP_SIZE_X * 2 + HOLDER_THICKNESS, 0, 0])
    cube([HOLDER_SIDE_DISTANCE - BAR_CLIP_SIZE_X * 2, BAR_HEIGHT, BAR_WIDTH]);

  translate([HOLDER_THICKNESS * 2 + HOLDER_SIDE_DISTANCE + BAR_CLIP_SIZE_X * 2, 0, 0])
    mirror([1, 0, 0])
      bar_clip();

}

translate([-80, 0, 0]) bar();

translate([0, 50, 0]) {
  render() {
    translate([0, 0, 0]) side_l();
    translate([0, 0, 0]) side_r();
  }
}
